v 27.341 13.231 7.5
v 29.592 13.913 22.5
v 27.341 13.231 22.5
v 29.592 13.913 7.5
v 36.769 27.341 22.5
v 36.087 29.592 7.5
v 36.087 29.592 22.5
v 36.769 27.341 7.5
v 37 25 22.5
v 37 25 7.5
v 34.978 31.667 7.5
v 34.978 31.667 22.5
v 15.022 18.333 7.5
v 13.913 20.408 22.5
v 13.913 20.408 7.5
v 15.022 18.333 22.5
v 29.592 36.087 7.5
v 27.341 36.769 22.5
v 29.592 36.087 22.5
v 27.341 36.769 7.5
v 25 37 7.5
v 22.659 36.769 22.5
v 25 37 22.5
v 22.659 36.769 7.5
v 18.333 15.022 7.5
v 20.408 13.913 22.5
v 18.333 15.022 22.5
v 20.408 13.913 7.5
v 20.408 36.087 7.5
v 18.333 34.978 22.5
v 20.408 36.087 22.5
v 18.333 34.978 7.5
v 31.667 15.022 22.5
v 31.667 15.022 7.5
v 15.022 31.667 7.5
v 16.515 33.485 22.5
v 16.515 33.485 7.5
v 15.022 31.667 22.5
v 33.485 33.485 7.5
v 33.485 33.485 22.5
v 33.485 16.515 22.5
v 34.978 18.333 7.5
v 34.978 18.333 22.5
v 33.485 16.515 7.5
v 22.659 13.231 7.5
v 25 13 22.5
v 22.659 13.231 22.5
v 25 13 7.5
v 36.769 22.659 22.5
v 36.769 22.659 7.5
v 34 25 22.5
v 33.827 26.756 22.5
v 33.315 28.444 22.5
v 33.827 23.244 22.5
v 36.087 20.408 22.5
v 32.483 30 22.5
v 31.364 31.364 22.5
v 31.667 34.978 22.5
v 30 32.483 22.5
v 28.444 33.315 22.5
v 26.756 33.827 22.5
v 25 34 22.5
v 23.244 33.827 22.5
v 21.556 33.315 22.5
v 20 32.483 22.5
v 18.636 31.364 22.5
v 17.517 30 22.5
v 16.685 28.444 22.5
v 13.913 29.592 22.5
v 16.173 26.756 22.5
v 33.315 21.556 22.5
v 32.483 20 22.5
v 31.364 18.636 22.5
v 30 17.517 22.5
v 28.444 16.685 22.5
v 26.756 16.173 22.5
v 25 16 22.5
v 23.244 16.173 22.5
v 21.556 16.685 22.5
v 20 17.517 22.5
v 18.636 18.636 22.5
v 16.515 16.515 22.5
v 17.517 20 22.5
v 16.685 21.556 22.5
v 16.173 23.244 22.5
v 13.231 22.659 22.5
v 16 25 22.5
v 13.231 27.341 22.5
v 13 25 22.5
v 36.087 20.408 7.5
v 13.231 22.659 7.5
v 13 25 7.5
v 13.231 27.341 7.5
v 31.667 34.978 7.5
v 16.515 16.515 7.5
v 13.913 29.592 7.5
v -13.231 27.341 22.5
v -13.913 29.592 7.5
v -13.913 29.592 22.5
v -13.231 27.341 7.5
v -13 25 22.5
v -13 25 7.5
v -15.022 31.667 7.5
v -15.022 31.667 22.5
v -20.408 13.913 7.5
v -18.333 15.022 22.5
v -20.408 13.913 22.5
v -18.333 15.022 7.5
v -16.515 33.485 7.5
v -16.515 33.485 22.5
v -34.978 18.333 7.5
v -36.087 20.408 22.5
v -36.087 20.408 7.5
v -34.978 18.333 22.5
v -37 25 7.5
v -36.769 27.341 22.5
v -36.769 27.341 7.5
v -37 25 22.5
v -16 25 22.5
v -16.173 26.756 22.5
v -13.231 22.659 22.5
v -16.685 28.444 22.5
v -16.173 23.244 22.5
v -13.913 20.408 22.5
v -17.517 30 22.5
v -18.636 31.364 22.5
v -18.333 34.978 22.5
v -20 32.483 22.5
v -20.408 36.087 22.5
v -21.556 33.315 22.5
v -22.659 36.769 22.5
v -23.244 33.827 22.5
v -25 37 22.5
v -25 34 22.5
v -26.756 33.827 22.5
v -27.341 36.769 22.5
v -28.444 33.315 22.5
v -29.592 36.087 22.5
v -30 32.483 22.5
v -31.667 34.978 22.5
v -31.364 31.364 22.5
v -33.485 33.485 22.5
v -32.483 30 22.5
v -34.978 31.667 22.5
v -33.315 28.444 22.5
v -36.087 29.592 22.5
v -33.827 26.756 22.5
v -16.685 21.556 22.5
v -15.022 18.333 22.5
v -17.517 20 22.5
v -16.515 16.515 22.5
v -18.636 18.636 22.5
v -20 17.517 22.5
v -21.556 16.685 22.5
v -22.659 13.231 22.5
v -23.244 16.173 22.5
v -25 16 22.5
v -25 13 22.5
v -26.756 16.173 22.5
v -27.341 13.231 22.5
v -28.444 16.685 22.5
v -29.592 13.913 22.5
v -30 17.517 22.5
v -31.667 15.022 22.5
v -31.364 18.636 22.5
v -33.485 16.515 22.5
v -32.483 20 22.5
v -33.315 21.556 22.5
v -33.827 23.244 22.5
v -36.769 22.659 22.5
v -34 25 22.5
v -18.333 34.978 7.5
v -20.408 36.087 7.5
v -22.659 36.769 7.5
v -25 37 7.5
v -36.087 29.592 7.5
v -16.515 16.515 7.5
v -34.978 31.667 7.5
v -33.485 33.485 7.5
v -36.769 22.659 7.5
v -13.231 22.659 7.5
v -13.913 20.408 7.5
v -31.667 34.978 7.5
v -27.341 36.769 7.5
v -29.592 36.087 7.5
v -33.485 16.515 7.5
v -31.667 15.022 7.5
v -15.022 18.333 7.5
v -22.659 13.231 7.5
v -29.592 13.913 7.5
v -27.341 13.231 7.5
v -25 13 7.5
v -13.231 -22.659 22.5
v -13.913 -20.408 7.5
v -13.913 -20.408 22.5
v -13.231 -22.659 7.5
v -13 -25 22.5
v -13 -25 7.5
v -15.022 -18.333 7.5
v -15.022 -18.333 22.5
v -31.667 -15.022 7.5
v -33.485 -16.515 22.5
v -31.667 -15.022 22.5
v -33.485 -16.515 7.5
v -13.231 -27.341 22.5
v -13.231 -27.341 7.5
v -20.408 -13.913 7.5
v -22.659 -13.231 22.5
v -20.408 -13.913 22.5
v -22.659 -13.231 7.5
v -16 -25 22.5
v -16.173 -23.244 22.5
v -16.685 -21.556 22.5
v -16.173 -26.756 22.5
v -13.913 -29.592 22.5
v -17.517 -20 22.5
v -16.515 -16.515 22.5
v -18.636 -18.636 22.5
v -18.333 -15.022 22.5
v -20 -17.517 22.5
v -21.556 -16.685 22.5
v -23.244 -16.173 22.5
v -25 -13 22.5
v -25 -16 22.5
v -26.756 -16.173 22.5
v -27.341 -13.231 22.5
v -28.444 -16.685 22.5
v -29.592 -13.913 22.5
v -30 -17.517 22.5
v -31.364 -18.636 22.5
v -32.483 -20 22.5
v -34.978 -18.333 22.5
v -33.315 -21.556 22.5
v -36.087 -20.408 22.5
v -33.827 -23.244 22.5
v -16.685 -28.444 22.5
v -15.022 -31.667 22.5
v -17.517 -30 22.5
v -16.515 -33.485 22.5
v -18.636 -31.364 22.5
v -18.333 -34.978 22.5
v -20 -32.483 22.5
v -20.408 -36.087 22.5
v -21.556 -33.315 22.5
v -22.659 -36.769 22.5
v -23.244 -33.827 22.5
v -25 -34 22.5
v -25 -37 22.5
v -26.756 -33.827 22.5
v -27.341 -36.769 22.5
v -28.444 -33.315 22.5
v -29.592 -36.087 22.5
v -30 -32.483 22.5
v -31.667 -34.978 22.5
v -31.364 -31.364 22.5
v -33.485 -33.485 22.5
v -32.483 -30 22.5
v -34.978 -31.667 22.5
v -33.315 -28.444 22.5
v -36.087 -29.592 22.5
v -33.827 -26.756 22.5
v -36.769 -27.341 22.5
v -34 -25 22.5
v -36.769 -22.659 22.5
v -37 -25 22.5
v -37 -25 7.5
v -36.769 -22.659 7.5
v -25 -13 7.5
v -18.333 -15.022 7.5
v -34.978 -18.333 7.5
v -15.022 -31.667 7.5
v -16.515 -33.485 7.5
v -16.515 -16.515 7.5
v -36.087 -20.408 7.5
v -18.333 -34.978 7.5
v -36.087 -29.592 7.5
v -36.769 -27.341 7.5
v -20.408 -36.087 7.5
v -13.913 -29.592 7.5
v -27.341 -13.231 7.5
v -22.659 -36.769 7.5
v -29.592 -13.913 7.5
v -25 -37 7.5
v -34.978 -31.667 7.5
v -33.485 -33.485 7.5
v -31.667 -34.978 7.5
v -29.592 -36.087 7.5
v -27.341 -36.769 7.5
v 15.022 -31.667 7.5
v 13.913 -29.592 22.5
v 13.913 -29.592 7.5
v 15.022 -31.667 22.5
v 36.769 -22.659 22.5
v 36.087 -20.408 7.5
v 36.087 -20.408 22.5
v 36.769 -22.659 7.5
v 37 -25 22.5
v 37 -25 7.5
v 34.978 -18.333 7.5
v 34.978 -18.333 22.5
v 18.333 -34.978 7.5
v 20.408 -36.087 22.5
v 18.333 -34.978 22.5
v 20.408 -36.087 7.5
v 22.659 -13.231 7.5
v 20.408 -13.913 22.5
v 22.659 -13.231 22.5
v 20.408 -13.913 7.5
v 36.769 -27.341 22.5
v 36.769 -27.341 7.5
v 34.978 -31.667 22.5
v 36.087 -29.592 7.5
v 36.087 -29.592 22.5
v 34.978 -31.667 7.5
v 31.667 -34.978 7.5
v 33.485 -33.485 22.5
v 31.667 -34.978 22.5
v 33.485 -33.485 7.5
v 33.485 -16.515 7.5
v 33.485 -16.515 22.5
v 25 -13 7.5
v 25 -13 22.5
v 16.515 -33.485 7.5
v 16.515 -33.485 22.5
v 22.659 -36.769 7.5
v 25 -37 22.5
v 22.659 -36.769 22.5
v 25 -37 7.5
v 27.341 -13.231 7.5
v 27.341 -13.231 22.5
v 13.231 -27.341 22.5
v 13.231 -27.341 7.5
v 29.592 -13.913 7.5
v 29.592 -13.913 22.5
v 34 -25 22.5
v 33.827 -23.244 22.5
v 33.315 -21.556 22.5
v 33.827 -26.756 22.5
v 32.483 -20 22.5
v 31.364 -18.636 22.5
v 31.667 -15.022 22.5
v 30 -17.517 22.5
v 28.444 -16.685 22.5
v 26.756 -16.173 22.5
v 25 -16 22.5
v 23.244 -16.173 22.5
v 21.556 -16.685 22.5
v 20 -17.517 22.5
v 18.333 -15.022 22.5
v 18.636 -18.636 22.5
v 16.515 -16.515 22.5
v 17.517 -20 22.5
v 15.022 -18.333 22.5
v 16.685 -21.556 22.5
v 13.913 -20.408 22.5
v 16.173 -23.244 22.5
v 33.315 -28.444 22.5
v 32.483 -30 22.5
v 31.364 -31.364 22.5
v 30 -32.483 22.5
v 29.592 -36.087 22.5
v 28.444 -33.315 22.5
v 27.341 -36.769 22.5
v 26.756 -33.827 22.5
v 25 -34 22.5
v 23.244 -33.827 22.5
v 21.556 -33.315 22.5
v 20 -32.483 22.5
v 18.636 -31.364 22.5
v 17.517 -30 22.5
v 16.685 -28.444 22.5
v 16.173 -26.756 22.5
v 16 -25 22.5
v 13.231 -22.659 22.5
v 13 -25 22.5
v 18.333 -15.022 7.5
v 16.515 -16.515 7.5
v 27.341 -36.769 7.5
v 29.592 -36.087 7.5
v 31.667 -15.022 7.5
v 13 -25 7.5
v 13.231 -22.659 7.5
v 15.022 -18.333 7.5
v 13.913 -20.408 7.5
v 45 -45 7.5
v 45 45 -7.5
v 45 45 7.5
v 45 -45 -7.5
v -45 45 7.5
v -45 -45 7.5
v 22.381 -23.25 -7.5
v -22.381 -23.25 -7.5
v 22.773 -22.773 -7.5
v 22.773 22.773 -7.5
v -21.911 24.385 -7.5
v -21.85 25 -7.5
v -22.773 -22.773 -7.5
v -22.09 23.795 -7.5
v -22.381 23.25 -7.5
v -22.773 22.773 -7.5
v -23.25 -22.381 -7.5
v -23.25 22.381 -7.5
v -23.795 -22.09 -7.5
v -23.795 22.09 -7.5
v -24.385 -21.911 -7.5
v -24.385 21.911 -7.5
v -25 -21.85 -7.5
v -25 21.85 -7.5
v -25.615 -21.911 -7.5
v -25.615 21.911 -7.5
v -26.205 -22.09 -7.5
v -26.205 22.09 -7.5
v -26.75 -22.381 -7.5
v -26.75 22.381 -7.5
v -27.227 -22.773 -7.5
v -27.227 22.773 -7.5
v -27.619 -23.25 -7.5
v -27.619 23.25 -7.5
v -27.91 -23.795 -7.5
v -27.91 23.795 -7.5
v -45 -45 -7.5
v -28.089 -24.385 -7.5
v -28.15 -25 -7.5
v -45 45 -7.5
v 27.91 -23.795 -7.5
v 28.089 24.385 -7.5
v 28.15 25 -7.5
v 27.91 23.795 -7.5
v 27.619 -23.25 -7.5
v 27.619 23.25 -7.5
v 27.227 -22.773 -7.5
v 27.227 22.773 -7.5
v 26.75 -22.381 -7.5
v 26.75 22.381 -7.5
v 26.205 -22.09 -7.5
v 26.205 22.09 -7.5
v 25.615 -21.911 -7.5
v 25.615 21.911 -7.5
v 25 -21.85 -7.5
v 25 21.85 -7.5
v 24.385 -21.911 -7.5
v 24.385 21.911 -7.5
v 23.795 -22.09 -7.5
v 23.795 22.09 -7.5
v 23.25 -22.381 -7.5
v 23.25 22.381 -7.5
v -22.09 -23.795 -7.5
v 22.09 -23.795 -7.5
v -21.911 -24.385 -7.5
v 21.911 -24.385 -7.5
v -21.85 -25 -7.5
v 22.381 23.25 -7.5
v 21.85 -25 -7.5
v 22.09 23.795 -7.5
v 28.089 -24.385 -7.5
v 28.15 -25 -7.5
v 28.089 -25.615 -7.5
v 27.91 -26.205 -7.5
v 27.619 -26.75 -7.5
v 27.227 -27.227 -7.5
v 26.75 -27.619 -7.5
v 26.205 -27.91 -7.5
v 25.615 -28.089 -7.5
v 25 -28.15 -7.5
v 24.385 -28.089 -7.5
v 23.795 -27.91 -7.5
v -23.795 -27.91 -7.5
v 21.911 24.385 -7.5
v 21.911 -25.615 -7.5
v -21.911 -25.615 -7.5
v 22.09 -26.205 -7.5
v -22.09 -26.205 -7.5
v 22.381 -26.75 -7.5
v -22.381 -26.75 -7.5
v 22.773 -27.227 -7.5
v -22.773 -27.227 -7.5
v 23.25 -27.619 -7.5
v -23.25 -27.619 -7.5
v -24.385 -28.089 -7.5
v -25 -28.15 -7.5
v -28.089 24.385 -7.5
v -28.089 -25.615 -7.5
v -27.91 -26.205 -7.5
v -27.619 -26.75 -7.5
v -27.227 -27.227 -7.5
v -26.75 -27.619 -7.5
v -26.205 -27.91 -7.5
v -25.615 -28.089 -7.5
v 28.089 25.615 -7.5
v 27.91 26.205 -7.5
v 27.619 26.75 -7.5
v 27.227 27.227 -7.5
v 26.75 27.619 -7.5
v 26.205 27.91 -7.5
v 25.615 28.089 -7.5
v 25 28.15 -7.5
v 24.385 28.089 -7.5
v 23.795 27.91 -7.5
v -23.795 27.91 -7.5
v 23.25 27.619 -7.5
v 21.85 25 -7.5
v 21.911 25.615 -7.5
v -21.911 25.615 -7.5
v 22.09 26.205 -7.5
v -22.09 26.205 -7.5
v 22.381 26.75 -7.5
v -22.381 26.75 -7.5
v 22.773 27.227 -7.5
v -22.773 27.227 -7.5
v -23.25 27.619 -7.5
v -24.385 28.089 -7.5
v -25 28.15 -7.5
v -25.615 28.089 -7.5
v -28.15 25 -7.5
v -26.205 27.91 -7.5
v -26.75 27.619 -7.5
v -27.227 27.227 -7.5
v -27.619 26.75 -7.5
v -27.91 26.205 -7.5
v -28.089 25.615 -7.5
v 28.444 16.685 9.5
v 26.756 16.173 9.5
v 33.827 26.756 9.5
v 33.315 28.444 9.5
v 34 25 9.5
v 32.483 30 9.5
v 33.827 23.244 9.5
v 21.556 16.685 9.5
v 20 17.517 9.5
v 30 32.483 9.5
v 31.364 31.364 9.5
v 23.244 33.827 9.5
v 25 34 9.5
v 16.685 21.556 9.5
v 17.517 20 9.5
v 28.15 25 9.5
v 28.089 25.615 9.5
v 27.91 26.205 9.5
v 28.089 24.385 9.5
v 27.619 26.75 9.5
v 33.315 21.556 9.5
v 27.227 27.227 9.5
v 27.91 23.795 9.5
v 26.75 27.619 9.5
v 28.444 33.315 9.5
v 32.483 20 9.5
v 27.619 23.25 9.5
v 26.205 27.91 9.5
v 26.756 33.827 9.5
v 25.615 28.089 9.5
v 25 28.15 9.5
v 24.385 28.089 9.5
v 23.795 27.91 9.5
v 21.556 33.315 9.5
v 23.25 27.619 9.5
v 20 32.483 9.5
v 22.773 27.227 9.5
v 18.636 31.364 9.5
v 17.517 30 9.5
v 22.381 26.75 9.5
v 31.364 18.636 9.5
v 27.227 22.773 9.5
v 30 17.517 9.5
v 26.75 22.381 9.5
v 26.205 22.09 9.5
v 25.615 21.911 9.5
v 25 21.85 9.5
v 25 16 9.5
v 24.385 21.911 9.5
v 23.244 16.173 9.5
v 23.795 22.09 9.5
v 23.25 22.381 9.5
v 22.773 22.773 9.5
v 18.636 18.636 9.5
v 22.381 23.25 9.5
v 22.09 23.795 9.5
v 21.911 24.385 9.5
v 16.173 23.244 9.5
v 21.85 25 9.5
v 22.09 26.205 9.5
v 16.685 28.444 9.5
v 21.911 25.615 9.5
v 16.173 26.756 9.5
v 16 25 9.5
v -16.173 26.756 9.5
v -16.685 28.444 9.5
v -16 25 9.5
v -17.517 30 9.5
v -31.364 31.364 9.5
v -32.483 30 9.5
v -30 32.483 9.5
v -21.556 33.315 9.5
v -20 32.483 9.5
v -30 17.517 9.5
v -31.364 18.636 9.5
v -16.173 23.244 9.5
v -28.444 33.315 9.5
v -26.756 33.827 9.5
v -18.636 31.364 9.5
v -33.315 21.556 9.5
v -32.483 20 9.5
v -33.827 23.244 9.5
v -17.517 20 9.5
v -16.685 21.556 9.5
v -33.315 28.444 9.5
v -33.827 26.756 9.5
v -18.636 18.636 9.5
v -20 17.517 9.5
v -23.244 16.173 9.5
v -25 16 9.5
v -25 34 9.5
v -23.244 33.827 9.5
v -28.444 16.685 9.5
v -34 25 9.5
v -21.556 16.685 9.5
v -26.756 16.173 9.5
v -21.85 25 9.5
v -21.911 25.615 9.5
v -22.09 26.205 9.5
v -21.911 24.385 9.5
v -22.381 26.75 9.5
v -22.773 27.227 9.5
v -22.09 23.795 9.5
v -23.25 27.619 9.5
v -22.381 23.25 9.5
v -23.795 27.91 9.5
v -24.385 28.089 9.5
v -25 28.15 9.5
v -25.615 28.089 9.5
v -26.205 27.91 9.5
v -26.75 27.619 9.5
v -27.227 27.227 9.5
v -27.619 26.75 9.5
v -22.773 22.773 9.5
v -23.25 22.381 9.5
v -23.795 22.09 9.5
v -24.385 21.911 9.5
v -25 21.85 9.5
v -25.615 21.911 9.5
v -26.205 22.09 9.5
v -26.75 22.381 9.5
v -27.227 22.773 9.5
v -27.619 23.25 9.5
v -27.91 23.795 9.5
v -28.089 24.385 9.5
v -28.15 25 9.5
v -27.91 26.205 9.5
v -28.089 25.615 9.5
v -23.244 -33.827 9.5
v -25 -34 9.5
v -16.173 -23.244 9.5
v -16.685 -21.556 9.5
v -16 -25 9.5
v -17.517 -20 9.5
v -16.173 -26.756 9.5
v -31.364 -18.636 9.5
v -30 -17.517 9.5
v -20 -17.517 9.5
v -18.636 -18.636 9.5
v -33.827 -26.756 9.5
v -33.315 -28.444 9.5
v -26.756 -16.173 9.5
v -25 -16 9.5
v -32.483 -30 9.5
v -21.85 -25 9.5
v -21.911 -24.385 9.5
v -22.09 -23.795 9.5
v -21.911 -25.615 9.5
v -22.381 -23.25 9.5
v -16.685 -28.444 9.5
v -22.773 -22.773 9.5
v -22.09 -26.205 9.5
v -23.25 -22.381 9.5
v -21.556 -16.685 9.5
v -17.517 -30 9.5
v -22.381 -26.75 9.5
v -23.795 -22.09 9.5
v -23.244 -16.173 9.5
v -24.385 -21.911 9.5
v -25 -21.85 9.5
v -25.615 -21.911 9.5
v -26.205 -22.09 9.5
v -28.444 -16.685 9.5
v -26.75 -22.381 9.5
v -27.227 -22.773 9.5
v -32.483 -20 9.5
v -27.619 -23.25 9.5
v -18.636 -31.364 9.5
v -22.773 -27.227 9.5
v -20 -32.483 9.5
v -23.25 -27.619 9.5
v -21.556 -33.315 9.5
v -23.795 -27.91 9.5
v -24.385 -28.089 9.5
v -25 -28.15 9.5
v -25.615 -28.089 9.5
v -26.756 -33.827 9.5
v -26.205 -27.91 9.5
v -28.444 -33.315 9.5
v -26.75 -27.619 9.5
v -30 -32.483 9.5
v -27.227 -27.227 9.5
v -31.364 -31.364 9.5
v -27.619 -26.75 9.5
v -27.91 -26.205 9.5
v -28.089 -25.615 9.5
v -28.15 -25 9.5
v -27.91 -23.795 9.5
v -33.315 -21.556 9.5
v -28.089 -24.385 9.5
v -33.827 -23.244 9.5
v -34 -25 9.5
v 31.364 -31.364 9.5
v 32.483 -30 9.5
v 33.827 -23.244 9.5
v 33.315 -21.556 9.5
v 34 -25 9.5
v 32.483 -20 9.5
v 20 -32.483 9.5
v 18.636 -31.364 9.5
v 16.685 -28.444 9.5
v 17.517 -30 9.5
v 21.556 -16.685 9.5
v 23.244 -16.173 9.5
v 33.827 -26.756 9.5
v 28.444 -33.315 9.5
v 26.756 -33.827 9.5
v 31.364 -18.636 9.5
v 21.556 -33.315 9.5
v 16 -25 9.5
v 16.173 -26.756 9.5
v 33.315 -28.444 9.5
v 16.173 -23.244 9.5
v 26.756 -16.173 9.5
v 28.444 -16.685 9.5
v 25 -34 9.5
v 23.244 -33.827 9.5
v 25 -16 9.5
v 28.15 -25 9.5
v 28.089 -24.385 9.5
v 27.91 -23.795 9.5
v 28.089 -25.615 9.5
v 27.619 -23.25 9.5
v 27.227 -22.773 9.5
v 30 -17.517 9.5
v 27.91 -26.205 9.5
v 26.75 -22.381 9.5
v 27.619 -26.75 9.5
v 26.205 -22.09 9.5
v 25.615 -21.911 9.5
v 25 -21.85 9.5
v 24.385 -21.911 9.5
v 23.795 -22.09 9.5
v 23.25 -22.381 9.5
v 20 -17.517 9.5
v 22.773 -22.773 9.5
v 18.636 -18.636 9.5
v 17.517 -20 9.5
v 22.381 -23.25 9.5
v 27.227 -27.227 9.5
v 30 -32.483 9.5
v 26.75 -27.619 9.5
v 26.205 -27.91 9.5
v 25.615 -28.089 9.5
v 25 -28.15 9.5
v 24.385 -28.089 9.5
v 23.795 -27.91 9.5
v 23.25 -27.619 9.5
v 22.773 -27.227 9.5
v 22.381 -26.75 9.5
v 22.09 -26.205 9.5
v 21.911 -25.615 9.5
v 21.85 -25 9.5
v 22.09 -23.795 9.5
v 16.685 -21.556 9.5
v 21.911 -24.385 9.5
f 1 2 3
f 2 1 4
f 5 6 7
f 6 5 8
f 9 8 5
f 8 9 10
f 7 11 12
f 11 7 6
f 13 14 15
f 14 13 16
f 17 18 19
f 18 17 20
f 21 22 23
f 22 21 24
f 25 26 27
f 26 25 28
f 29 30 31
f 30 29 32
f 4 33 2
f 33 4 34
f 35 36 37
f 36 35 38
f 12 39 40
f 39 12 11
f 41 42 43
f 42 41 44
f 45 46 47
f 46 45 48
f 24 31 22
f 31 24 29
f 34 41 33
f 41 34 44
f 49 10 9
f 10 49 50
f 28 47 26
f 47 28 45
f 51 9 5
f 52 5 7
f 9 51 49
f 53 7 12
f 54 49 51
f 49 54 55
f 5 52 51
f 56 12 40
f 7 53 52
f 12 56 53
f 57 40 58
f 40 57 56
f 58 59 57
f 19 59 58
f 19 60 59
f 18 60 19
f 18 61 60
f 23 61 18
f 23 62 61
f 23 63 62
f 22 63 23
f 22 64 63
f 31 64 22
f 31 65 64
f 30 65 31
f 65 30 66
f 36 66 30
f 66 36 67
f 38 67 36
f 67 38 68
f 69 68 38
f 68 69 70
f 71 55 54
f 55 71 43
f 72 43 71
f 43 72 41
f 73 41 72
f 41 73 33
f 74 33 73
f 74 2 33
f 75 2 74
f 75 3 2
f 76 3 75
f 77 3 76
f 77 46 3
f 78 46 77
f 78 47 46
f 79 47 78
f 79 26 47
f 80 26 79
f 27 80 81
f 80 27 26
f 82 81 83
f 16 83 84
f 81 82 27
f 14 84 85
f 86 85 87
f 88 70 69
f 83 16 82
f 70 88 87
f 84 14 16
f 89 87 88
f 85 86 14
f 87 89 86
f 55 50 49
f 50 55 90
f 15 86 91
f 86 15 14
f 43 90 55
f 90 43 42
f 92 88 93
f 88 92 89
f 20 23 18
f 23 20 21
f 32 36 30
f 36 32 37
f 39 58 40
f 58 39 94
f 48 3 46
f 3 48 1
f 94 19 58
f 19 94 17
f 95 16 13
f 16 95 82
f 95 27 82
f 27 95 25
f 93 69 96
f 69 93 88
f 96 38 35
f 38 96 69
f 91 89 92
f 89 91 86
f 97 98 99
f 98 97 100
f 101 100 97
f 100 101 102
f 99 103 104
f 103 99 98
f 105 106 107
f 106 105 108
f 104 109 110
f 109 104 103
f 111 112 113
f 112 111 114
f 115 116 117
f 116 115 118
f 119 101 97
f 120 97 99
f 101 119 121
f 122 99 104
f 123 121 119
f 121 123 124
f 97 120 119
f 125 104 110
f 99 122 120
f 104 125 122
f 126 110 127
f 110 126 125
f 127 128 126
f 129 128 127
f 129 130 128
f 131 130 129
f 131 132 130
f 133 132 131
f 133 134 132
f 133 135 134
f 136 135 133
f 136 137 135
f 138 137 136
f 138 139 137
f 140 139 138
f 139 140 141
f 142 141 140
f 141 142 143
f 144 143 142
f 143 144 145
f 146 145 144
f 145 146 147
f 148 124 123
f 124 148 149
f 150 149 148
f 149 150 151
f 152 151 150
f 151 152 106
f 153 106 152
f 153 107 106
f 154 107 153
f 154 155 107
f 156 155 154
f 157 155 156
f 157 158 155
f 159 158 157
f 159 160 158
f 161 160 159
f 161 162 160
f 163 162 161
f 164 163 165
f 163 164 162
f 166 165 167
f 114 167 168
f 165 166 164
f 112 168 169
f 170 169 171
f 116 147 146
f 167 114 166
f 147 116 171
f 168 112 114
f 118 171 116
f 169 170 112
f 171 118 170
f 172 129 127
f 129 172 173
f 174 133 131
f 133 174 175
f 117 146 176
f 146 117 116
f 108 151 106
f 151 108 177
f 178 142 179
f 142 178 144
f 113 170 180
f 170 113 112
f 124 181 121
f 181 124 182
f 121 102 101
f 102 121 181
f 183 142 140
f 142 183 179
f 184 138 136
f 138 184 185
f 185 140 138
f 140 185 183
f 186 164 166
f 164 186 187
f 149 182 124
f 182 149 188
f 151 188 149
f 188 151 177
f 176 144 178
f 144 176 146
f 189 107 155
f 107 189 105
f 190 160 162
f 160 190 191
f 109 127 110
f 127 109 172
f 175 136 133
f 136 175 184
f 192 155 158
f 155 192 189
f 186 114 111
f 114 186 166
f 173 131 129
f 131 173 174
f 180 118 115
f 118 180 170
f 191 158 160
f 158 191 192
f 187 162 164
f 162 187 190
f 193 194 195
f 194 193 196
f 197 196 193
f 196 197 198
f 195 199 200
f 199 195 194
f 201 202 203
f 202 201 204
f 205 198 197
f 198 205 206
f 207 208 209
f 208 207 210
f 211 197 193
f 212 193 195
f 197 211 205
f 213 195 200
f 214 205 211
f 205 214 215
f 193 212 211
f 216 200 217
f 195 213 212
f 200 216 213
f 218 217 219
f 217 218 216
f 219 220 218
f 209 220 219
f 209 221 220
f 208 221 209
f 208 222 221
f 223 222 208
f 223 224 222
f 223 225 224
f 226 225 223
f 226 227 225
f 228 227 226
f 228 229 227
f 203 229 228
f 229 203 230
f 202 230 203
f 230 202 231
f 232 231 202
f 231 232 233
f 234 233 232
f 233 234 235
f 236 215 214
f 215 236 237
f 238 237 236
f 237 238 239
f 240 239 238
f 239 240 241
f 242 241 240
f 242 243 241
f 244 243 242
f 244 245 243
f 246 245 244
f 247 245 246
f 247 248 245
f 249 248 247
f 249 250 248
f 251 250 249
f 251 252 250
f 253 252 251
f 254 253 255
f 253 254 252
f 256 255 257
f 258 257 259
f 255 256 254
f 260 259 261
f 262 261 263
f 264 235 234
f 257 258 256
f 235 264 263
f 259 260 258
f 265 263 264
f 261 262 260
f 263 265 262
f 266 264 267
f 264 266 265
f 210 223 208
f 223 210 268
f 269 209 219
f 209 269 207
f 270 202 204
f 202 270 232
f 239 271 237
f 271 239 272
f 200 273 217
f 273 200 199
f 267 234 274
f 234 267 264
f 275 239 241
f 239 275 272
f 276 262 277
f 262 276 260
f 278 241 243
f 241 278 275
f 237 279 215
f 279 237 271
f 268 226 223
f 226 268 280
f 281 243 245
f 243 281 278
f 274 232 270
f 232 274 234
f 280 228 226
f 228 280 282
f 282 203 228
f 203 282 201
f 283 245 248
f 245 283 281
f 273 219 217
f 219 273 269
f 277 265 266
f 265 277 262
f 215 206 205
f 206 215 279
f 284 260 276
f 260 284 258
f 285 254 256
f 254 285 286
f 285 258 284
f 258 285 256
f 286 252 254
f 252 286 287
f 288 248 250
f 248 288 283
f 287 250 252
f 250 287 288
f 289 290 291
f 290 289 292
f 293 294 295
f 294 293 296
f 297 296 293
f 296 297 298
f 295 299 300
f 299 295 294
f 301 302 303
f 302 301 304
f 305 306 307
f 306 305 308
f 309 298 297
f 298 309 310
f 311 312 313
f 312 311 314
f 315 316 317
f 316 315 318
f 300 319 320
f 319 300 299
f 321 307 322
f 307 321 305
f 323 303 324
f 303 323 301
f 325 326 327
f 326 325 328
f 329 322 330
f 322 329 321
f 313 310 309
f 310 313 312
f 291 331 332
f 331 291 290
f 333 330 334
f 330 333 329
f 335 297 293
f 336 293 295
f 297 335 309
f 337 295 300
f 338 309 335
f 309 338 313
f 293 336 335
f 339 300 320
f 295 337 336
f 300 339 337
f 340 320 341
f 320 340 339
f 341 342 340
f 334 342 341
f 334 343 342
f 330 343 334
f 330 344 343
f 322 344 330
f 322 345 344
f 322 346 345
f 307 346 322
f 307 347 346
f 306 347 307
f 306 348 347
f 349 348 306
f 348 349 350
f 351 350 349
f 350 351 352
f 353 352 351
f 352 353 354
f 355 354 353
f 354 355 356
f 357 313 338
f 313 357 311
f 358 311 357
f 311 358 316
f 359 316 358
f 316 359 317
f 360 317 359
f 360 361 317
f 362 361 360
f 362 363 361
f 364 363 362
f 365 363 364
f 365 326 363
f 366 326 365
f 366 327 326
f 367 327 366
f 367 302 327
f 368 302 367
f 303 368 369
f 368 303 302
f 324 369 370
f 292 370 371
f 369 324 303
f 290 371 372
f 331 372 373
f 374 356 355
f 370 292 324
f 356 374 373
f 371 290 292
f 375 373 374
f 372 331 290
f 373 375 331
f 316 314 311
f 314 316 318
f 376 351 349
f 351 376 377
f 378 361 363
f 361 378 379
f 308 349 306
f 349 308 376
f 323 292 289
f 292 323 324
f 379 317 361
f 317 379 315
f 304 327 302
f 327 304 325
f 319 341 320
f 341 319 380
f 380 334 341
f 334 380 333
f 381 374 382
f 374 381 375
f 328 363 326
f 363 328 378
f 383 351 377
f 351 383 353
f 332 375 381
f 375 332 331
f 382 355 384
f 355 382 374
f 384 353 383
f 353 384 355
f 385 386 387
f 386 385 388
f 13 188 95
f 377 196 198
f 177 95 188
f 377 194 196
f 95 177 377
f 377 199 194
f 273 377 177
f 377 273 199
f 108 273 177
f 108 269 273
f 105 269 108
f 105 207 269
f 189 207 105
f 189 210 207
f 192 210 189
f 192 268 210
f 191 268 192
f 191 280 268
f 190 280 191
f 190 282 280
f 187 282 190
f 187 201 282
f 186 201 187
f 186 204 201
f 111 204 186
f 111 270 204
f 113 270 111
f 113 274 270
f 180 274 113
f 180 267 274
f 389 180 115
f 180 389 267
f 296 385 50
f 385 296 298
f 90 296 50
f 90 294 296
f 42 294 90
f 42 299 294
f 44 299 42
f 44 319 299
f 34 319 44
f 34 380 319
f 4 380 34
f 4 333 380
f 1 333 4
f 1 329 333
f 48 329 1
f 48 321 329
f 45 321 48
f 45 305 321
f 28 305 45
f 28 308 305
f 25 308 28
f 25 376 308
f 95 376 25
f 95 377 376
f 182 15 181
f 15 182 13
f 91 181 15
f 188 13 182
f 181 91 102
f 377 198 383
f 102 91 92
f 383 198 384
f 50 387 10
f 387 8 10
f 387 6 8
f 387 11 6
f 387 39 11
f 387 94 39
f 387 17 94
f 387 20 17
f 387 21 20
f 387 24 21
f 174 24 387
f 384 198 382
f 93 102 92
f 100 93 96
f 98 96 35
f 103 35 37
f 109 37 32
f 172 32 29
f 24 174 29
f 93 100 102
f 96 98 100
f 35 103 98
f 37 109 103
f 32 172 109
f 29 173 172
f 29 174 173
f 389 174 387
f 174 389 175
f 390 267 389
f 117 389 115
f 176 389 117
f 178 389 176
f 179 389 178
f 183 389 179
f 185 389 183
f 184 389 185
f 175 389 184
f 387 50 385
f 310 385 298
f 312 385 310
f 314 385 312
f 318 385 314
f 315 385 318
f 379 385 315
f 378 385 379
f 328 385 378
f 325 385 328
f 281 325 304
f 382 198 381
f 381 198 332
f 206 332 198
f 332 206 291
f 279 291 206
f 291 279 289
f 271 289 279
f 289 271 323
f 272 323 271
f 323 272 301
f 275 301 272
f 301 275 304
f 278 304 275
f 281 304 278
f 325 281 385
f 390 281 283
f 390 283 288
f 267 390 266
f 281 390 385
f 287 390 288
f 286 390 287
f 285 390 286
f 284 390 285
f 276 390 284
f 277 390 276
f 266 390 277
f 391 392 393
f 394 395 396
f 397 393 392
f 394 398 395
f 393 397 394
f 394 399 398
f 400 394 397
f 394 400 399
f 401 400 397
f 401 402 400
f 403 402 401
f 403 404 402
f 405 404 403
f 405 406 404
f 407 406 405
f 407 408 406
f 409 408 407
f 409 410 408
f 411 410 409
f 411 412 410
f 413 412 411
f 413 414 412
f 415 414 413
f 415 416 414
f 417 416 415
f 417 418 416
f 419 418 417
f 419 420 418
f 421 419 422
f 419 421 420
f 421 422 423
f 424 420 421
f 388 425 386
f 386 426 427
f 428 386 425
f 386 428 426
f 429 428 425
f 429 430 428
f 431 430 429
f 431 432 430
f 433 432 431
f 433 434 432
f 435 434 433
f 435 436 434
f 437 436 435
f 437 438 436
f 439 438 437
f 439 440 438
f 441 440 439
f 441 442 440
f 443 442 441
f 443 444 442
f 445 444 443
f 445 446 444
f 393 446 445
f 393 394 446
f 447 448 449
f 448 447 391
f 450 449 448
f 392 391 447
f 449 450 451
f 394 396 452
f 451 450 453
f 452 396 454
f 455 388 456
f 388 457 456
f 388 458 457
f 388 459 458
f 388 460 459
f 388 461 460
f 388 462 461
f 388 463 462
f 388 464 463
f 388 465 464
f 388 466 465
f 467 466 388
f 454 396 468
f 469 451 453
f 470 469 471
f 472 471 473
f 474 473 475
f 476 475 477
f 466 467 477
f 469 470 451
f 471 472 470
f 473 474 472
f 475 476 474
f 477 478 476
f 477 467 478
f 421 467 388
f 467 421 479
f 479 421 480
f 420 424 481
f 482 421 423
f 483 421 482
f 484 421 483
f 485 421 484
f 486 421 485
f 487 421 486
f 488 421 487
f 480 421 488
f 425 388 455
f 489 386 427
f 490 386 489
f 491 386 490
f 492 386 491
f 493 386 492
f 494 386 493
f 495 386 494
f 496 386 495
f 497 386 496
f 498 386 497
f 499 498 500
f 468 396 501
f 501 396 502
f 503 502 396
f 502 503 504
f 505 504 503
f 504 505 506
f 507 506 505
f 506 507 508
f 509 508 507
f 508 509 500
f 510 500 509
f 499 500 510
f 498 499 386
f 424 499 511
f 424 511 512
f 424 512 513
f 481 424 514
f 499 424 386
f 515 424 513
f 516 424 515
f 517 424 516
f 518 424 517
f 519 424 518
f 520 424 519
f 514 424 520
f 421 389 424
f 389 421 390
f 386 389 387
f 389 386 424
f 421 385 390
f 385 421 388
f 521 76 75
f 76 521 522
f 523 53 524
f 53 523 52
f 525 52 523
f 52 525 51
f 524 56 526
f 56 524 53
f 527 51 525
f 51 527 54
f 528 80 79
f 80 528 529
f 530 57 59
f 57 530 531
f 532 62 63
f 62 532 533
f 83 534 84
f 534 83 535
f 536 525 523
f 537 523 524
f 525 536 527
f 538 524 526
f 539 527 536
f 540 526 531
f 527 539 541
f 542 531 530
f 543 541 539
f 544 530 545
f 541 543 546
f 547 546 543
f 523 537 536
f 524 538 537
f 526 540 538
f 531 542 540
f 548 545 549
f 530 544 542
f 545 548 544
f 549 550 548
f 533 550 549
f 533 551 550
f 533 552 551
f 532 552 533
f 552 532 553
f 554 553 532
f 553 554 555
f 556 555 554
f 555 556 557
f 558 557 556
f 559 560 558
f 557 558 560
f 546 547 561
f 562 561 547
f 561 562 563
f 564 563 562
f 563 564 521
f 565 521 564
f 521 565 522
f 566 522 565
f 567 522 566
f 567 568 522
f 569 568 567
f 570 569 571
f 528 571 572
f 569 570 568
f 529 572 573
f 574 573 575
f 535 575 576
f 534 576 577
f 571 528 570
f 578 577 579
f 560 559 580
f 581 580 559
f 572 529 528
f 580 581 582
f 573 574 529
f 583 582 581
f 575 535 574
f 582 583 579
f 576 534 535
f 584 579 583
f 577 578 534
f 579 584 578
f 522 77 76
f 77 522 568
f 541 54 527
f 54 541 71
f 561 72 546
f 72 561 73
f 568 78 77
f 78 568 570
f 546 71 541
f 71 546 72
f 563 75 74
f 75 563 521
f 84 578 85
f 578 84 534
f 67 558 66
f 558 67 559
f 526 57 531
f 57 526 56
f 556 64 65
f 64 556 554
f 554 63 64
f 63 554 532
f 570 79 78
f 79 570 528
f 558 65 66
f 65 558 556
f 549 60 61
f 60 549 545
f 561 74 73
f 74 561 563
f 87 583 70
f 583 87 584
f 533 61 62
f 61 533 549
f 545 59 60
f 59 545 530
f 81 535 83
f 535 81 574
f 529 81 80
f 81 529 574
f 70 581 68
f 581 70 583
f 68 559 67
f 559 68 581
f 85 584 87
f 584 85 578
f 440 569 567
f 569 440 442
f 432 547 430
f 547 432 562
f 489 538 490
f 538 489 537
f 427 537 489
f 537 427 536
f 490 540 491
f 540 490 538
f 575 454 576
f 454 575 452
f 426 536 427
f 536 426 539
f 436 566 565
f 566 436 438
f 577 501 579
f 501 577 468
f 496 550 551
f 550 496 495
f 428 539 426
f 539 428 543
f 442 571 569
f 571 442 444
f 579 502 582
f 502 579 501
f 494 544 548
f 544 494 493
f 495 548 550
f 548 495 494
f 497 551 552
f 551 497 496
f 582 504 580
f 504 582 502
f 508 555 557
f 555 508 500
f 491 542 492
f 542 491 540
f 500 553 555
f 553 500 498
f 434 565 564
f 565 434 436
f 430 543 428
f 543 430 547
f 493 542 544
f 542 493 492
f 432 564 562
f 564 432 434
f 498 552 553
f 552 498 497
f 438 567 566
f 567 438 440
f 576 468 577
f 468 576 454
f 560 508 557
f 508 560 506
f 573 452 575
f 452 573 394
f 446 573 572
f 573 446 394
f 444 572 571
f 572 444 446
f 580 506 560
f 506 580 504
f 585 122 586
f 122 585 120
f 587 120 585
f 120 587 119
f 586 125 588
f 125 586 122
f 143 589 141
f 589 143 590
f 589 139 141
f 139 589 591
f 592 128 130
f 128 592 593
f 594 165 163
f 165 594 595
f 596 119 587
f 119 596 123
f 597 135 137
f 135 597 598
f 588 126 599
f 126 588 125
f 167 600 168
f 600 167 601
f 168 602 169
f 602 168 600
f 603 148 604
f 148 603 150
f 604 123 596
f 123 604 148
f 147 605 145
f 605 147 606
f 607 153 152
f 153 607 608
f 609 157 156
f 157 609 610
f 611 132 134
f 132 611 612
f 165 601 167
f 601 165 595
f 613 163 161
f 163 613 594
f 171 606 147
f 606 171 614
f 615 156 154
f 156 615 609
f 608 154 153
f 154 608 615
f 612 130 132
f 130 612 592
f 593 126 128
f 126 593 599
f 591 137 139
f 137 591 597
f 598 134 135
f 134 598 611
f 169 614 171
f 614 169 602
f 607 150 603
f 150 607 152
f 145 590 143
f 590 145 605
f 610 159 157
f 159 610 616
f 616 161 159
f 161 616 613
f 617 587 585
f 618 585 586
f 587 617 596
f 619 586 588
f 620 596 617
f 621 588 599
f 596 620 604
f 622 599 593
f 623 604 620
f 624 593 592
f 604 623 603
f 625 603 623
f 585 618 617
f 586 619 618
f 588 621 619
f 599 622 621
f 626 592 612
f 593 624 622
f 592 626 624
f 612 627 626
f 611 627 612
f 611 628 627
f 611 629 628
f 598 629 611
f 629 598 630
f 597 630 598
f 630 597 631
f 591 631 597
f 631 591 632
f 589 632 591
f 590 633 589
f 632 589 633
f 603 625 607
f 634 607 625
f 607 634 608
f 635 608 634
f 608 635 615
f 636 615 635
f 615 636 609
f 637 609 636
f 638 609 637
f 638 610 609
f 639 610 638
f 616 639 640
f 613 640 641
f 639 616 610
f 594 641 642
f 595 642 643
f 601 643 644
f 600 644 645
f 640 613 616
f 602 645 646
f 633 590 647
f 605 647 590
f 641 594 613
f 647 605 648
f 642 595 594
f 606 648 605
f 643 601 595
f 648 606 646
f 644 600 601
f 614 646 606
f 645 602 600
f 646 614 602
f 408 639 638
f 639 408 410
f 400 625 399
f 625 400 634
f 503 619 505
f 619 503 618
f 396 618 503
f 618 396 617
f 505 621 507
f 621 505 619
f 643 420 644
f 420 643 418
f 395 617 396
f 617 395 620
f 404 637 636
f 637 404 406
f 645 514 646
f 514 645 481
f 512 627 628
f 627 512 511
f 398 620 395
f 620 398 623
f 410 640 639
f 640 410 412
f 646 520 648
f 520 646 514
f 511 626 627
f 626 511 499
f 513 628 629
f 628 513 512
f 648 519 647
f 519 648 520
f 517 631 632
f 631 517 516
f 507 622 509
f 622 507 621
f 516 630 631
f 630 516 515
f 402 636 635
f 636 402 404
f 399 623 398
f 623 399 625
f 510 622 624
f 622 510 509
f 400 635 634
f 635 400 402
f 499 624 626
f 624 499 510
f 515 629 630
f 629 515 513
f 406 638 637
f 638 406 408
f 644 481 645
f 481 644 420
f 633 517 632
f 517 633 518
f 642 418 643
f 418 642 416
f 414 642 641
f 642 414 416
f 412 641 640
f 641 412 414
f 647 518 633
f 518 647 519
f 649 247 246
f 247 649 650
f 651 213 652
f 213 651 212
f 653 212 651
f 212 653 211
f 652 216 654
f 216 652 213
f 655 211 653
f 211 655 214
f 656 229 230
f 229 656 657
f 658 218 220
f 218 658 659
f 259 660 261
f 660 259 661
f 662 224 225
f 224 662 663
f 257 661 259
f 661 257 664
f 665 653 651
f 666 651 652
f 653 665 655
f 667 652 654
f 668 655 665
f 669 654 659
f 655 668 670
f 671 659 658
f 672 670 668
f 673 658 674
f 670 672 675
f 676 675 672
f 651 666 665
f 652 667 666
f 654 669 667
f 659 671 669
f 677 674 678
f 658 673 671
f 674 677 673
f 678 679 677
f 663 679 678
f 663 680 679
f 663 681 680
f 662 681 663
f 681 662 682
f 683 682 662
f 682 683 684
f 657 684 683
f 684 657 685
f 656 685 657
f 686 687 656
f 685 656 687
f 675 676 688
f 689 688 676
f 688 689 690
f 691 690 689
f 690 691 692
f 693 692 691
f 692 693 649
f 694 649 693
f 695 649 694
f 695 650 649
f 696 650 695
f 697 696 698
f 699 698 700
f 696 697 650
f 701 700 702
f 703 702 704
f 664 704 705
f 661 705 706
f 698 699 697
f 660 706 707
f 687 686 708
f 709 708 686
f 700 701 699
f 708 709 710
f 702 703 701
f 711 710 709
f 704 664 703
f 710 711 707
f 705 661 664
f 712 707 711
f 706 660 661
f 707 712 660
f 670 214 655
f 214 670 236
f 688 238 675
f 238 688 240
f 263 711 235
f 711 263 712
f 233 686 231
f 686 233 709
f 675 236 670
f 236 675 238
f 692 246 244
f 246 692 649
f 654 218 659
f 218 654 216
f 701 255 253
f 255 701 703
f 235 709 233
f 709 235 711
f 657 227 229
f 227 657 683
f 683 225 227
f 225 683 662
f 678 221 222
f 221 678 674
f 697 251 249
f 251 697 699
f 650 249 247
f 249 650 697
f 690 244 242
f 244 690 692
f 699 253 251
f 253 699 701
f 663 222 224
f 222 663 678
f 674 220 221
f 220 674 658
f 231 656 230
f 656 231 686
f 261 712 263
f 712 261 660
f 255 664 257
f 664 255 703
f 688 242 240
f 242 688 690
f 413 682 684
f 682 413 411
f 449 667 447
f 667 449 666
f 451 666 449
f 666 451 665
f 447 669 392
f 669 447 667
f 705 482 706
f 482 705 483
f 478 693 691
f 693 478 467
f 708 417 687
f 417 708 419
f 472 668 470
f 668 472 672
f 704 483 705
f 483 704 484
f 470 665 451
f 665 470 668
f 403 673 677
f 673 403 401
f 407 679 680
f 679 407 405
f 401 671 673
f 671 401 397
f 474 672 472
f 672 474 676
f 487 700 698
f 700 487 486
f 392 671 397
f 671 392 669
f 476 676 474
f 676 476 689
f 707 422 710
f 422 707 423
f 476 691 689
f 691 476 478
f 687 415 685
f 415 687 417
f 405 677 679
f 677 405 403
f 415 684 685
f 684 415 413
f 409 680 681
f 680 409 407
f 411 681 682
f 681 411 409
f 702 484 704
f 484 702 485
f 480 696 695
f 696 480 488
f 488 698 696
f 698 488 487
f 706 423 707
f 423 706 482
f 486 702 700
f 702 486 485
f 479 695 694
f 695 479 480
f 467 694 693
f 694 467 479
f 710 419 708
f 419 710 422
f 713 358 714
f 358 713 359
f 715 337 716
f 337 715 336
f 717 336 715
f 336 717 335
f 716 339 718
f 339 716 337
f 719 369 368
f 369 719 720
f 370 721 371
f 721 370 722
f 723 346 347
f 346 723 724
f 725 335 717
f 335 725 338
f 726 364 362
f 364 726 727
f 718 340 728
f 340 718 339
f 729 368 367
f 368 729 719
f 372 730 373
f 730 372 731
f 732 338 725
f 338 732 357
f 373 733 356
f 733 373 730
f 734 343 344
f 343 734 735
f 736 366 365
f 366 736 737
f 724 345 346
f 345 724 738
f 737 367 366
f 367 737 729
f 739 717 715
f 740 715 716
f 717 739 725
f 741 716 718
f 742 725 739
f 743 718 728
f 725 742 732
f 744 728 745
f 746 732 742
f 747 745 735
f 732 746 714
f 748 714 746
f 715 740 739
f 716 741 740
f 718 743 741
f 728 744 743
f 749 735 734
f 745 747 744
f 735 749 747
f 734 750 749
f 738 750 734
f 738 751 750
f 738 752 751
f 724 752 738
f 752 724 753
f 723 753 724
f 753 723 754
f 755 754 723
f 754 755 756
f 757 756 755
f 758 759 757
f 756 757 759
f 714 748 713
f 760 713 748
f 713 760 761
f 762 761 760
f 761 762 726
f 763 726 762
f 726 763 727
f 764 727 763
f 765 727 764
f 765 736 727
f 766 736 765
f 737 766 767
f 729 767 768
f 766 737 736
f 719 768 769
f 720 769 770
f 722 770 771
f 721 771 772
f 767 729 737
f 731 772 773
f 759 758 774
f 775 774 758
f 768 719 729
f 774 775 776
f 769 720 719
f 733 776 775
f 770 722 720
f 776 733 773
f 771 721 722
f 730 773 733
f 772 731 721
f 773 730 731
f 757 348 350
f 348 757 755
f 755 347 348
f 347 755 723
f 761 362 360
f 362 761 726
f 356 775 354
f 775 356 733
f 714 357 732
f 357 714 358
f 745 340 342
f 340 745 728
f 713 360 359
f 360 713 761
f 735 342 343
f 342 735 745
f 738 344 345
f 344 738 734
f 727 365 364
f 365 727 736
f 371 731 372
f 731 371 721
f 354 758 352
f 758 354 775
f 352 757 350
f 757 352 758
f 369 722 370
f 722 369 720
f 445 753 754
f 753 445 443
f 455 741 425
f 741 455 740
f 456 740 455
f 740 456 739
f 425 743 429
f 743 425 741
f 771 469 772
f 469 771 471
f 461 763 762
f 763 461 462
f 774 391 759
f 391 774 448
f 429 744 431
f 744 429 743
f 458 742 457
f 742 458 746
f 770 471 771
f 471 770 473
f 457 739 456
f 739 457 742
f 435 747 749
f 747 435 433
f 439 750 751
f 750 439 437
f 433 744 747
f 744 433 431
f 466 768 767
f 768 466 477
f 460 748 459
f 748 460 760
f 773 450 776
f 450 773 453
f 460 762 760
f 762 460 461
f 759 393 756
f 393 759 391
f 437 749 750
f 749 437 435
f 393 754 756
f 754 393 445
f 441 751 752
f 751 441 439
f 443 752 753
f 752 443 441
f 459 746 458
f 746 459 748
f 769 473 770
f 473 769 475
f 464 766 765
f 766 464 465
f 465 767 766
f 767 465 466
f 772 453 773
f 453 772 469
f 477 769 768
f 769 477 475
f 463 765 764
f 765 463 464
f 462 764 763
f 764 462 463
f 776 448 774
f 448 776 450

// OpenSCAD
$fn = 32;

// ----------------------------------------------------------------------
// Socket pad plate
// bosses with counterbored sockets for the screws
// ----------------------------------------------------------------------

// --- parameters (mm) ---
base_t = 15;           // base plate thickness
boss_h = 15;           // boss height above the base plate
boss_d = 24;           // boss diameter
socket_d = 18;         // socket diameter
socket_depth = 13;     // socket depth from the boss face
bolt_d = 6.3;          // screw clearance hole through the socket floor
plate = [90, 90, 15];  // overall size (x, y, z)
edge = 20;             // boss centre offset from the plate edge
pads = 4;              // boss count, one per corner

// --- derived feature positions (mm) ---
height = base_t + boss_h;        // = 30   overall height of the part
corner_x = plate[0] / 2 - edge;  // = 25   boss centre X
corner_y = plate[1] / 2 - edge;  // = 25   boss centre Y
feature_centers = [
  [corner_x, corner_y],
  [-corner_x, corner_y],
  [-corner_x, -corner_y],
  [corner_x, -corner_y]
];   // boss centres: sockets, holes and the pads themselves are placed from here

// base plate, bosses on feature_centers, socket + through hole in each
difference() {
  union() {
    cube(plate, center = true);
    for (centre = feature_centers)
      translate([centre[0], centre[1], plate[2] / 2 - 1])
        cylinder(d = boss_d, h = boss_h + 1);
  }
  for (centre = feature_centers) {
    translate([centre[0], centre[1], plate[2] / 2 + boss_h - socket_depth])
      cylinder(d = socket_d, h = socket_depth + 1);
    translate([centre[0], centre[1], -height])
      cylinder(d = bolt_d, h = 2 * height + 2);  // through the socket floor
  }
}
